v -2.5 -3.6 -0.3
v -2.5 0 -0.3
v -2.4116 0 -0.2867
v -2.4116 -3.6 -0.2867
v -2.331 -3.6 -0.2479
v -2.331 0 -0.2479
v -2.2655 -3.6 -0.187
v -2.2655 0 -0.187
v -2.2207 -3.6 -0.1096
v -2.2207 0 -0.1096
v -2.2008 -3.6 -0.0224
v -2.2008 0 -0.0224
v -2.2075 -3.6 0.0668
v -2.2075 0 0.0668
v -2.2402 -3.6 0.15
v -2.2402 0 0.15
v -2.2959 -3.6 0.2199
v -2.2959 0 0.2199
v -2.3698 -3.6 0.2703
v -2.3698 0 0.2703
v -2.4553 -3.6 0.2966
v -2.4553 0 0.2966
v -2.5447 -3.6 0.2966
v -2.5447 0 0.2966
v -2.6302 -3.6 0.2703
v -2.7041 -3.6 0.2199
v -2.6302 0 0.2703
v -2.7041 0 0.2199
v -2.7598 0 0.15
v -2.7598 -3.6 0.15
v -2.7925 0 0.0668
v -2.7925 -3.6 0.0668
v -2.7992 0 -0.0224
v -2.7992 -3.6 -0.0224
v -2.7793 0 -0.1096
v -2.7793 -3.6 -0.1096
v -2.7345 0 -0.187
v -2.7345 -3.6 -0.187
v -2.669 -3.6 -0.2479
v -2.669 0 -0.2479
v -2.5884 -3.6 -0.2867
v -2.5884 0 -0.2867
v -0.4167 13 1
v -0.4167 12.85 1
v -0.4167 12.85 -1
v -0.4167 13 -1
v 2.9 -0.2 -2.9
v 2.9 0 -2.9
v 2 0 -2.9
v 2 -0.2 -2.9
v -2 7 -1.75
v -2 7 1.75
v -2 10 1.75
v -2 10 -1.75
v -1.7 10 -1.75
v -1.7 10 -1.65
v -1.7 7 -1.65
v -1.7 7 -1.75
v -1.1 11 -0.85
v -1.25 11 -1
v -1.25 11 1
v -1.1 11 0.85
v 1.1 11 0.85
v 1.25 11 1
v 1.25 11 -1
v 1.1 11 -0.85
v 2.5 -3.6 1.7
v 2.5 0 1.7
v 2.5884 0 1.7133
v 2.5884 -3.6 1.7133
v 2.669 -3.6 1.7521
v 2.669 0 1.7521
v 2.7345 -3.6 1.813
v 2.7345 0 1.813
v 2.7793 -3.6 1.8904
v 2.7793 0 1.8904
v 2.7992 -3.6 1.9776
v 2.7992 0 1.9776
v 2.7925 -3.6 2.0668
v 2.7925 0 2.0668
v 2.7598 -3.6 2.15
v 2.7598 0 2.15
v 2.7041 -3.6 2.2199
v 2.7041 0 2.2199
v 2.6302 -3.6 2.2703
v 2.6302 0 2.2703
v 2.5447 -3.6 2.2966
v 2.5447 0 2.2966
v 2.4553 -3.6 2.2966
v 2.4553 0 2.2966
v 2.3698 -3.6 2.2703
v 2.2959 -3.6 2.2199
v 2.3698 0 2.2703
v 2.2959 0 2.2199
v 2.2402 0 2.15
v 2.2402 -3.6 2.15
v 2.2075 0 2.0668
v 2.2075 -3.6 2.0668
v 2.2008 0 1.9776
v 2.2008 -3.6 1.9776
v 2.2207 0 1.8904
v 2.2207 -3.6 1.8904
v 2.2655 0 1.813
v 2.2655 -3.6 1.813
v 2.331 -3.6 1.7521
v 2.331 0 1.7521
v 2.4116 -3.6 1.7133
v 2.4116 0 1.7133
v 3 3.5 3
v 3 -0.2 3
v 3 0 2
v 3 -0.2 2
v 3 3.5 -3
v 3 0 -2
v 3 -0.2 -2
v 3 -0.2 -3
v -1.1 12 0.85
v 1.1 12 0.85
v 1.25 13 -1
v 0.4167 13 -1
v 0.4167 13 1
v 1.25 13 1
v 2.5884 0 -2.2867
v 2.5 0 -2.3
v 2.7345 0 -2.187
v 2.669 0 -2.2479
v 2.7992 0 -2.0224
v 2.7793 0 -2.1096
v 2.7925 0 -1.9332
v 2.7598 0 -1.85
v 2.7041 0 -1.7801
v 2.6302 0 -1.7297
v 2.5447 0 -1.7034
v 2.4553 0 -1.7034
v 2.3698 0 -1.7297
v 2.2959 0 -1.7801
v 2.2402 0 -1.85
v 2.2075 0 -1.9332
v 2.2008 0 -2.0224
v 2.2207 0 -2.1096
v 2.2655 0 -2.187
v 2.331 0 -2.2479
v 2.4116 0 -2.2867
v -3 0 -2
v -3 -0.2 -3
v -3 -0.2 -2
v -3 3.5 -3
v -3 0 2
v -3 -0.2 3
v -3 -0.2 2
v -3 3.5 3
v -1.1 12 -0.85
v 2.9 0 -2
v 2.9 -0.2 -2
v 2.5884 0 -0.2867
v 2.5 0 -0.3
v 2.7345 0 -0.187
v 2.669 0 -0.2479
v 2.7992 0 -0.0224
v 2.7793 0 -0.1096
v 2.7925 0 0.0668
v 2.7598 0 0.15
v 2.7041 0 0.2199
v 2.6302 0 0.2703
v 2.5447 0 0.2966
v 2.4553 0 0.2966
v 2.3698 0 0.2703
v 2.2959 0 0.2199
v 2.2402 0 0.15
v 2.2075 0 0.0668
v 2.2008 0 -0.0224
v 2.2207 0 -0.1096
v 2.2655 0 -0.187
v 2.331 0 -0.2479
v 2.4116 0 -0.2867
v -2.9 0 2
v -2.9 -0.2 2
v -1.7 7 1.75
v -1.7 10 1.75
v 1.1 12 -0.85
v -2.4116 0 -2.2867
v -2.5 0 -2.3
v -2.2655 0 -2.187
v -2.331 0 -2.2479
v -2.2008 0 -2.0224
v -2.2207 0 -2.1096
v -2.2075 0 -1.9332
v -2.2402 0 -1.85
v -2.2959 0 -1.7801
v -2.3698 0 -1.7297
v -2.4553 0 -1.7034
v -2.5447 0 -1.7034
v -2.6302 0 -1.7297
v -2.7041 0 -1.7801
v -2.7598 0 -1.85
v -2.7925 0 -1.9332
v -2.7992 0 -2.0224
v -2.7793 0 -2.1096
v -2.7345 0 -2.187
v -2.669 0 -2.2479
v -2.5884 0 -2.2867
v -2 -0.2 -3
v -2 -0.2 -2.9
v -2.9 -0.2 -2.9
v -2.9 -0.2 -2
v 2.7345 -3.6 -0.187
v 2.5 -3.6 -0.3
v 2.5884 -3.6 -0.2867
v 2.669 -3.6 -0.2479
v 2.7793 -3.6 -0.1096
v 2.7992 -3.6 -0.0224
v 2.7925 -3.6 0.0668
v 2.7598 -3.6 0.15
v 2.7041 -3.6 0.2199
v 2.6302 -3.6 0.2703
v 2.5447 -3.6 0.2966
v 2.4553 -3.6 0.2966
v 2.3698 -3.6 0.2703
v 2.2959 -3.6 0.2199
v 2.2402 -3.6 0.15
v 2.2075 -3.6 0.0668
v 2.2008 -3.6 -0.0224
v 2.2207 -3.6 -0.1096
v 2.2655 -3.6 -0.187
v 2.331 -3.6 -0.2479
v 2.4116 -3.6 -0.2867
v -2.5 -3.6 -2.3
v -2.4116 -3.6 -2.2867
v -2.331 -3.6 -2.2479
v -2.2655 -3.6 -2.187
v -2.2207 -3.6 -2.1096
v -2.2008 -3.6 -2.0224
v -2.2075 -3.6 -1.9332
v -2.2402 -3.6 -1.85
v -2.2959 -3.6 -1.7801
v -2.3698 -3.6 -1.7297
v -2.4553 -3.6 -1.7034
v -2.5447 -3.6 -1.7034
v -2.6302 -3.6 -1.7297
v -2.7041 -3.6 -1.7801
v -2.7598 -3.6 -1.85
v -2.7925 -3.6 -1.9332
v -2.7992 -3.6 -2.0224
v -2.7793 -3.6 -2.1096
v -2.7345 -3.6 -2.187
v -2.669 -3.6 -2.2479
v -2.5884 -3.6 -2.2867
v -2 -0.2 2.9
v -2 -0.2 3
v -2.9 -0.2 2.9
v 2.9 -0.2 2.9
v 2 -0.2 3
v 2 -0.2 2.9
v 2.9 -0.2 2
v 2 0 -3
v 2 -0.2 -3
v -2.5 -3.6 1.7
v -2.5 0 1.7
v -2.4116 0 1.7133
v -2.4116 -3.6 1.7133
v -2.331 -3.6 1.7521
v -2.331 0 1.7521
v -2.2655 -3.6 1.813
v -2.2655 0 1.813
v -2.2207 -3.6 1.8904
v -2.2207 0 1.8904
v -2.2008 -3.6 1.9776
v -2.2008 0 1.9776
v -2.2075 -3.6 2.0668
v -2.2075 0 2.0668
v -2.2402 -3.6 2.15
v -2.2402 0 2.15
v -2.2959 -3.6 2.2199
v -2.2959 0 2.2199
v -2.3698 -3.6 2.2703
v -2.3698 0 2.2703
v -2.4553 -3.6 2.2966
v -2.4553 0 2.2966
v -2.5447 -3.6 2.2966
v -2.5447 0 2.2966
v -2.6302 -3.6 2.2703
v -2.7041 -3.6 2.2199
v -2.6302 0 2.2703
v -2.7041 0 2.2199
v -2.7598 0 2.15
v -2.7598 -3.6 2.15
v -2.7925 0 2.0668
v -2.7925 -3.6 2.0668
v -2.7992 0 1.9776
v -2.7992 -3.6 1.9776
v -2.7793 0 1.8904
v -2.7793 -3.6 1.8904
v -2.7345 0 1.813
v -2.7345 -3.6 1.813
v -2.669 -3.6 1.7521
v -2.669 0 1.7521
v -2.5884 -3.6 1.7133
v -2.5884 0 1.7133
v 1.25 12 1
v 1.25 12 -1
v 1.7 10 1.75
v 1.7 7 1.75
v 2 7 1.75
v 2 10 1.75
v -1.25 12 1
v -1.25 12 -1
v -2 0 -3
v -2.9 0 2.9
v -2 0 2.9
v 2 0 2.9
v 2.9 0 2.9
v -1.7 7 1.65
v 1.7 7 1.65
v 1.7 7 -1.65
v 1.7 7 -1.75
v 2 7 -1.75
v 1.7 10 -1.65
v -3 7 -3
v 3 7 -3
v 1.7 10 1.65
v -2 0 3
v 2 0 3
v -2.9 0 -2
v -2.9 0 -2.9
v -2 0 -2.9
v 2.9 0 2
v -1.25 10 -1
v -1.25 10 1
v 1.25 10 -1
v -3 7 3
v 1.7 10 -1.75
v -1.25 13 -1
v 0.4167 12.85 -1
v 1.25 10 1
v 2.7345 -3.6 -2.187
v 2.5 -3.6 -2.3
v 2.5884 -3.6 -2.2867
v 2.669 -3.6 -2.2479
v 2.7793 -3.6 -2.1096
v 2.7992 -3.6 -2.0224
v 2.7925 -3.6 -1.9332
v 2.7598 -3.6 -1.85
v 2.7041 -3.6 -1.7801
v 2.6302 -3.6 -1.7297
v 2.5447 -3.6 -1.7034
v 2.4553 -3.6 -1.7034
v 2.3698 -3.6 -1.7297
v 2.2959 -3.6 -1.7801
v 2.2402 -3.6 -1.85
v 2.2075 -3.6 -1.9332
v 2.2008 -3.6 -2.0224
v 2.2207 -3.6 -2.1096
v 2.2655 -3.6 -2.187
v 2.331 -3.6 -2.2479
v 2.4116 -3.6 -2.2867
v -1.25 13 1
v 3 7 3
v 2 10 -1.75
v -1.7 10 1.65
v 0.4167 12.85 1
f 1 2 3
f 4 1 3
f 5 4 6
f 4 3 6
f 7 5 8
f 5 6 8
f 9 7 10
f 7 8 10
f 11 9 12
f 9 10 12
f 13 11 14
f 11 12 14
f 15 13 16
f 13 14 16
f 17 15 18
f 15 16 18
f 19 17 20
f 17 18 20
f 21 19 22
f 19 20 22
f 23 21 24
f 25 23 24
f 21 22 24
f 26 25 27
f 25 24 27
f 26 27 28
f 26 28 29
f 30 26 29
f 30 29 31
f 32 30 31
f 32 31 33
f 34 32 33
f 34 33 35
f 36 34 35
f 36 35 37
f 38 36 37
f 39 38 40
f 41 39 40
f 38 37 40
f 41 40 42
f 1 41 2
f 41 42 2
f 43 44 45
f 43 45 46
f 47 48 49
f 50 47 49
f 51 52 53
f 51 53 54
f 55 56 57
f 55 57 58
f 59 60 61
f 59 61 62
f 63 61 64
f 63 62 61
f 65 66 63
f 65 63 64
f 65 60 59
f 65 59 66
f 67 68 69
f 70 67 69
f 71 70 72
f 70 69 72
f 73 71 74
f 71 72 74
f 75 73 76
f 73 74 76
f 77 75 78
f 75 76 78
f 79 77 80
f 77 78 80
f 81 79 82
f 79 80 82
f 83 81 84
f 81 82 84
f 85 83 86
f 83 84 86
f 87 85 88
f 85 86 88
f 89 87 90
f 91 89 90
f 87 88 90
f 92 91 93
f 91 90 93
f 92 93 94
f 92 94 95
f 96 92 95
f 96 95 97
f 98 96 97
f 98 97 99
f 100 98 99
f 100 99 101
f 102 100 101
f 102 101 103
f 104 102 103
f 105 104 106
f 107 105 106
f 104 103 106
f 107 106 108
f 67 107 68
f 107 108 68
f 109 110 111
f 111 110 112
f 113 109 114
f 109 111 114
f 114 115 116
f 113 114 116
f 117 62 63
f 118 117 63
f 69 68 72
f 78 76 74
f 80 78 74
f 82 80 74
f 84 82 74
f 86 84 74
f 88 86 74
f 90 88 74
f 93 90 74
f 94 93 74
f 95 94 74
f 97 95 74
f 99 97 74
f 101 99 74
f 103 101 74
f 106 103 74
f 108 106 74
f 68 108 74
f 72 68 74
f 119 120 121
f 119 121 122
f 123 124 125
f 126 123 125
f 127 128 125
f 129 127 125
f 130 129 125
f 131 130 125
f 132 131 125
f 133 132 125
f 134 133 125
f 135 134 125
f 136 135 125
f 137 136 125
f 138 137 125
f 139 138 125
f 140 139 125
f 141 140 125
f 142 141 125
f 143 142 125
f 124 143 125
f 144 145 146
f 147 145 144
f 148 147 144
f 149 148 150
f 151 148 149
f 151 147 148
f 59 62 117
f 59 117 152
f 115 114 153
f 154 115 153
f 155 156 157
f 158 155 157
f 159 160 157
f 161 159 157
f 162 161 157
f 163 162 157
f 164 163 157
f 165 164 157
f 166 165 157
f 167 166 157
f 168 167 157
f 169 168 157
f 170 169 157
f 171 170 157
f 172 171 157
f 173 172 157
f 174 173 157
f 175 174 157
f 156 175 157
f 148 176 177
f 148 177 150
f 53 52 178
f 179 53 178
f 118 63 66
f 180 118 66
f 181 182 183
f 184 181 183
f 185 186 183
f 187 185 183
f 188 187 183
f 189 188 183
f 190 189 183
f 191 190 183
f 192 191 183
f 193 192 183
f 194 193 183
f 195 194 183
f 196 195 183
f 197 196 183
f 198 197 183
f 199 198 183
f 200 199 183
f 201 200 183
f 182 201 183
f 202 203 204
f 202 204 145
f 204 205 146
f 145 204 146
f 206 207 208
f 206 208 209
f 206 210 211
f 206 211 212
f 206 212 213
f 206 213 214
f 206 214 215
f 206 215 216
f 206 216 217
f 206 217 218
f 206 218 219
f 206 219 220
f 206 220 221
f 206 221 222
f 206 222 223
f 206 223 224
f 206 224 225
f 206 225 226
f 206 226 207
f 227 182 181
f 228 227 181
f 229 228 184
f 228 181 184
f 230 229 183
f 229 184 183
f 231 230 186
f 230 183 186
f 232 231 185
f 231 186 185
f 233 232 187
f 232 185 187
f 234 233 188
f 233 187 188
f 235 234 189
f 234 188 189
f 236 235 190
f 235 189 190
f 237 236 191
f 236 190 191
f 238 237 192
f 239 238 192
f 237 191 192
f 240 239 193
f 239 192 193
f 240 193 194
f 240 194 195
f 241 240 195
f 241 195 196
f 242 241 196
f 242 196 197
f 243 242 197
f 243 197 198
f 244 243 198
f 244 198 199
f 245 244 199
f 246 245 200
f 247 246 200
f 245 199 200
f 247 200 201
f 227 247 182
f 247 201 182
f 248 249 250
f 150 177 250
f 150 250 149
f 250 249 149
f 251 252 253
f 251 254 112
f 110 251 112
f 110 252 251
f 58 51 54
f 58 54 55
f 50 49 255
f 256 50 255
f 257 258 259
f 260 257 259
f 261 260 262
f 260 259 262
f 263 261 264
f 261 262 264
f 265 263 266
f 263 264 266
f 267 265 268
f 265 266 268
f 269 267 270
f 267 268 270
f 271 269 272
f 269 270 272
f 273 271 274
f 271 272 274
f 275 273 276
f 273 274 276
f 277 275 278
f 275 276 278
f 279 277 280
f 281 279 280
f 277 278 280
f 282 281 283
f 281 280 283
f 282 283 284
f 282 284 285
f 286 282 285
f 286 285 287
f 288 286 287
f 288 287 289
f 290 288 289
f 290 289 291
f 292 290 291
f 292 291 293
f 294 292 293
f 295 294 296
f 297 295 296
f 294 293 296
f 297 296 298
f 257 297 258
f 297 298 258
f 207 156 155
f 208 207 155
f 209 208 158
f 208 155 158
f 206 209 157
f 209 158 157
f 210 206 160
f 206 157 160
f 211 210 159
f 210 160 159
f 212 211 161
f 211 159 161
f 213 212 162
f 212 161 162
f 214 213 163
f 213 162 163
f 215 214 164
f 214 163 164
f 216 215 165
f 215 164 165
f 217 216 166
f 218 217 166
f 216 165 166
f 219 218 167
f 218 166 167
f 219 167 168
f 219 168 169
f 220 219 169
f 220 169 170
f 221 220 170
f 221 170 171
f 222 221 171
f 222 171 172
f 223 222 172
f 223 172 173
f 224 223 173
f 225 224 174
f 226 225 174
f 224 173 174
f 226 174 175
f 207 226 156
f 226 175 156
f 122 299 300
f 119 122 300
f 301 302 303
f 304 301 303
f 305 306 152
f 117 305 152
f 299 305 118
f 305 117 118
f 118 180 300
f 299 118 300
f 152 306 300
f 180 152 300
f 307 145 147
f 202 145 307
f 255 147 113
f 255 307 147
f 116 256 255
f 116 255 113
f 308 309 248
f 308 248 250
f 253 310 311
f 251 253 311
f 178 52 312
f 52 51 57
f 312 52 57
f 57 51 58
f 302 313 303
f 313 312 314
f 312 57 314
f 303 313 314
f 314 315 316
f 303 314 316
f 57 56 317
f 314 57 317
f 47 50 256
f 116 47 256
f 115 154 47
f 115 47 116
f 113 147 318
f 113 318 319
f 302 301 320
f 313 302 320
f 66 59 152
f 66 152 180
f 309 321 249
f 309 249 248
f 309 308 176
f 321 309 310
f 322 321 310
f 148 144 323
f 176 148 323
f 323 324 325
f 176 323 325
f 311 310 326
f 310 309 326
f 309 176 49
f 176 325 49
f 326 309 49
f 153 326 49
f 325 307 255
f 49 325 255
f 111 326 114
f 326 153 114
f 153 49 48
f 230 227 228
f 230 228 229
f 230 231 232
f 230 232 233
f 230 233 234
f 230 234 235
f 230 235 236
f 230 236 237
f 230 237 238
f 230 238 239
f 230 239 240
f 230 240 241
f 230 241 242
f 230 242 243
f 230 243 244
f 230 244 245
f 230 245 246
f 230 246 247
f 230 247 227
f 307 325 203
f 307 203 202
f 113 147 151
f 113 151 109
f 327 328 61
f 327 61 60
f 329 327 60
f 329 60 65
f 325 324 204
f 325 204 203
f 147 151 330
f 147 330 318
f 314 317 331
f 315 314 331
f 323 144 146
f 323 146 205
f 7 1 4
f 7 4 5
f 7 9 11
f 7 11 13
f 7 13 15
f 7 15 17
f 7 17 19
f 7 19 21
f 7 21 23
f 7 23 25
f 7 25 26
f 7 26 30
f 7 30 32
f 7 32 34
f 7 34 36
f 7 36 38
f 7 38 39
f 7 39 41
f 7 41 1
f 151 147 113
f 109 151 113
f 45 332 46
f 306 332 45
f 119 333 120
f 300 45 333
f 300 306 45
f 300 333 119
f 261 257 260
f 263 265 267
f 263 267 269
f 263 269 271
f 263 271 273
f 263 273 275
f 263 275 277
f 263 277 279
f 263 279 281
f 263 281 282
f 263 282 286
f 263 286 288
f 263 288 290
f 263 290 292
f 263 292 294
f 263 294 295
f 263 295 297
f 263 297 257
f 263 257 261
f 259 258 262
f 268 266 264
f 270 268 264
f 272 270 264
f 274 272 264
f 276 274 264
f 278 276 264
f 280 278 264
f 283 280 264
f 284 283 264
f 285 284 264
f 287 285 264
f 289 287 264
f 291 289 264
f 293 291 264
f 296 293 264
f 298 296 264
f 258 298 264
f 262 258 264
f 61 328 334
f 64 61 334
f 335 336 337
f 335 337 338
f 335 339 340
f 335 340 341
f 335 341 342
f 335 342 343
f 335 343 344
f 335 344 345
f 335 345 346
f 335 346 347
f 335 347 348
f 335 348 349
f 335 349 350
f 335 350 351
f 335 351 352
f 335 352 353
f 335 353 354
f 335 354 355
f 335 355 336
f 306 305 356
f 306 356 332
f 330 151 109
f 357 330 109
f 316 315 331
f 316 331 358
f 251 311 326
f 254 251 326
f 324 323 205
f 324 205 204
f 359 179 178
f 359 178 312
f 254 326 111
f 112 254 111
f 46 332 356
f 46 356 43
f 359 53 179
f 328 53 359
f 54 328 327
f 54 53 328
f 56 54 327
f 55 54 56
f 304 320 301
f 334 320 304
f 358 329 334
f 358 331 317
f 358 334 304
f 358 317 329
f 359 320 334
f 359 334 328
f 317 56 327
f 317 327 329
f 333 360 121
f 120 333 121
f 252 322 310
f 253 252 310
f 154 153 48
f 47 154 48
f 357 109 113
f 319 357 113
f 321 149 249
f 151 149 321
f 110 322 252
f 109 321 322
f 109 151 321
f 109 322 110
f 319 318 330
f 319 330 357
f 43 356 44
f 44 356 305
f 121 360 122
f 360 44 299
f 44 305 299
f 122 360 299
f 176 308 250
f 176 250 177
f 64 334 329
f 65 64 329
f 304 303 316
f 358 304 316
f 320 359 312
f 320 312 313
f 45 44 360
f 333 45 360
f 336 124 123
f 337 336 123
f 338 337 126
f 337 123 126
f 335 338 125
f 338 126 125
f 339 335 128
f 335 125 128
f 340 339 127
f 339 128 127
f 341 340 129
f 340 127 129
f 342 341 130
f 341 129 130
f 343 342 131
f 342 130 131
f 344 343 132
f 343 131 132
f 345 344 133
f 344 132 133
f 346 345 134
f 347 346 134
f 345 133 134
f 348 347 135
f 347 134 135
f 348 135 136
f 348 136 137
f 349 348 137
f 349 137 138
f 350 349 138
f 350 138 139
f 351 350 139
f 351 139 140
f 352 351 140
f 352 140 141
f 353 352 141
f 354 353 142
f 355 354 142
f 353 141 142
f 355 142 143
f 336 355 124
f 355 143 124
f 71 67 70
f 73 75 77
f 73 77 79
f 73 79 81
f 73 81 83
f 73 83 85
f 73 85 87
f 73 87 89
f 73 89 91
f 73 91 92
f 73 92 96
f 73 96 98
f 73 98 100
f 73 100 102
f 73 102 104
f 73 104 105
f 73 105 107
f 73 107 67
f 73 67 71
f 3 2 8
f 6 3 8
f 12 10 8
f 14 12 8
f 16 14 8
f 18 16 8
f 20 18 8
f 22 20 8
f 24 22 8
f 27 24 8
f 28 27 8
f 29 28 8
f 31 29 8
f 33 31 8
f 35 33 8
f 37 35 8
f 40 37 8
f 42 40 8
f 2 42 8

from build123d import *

# Parameters (mm, degrees)
SKETCH_1_W                     = 6
SKETCH_1_H                     = 6
EXTRUDE_1_DEPTH                = 7
SPLIT_BODIES_1_SURFACE_1_BACK  = 12
SPLIT_BODIES_1_SURFACE_1_DEPTH = 24
SPLIT_BODIES_1_SURFACE_2_BACK  = 12
SPLIT_BODIES_1_SURFACE_2_DEPTH = 24
SKETCH_3_W                     = 4
SKETCH_3_H                     = 3.5
EXTRUDE_2_DEPTH                = 3
EXTRUDE_START                  = 3
SKETCH_3_3_W                   = 2.5
SKETCH_3_3_H                   = 2
EXTRUDE_3_DEPTH                = 3
SKETCH_4_W                     = 0.833333334
SKETCH_4_H                     = 0.3
CUT_EXTRUDE_1_DEPTH            = 14.928388277
SWEEP_START                    = 11
SWEEP_1_OUTLINE_W              = 2.5
SWEEP_1_OUTLINE_H              = 2
SWEEP_1_OUTLINE_W_2            = 2.2
SWEEP_1_OUTLINE_H_2            = 1.7
SWEEP_1_DEPTH                  = 1
SKETCH_10_W                    = 3.4
SKETCH_10_H                    = 0.2
CUT_EXTRUDE_2_DEPTH            = 3
EXTRUDE_4_DEPTH                = 0.2
SKETCH_12_R                    = 0.3
EXTRUDE_5_DEPTH                = 3.6
EXTRUDE_5_2_DEPTH              = 3.6
EXTRUDE_5_3_DEPTH              = 3.6
EXTRUDE_5_4_DEPTH              = 3.6
EXTRUDE_5_5_DEPTH              = 3.6
EXTRUDE_5_6_DEPTH              = 3.6


# Read off the part's stored shape, not the designer's step: Вырез-По траектории1
with BuildPart() as part:
    # Эскиз1 → Бобышка-Вытянуть1 (new body)
    with BuildSketch(Plane(origin=(0, 0, 0), x_dir=(1, 0, 0), z_dir=(0, 1, 0))):
        Rectangle(SKETCH_1_W, SKETCH_1_H)
    extrude(amount=EXTRUDE_1_DEPTH)


with BuildPart() as body_2:
    # Split Bodies 1: the piece behind the surface
    add(part.part)
    # Split Bodies 1 surface: a surface, the sketch's curves swept straight by 24 mm
    with BuildLine(Plane.XY.offset(3).offset(-SPLIT_BODIES_1_SURFACE_1_BACK), mode=Mode.PRIVATE) as split_bodies_1_surface_1_path:
        Line((-3, 3.5), (3, 3.5))
    split_bodies_1_surface_1 = Shell.extrude(split_bodies_1_surface_1_path.wire(), (0 * SPLIT_BODIES_1_SURFACE_1_DEPTH, 0 * SPLIT_BODIES_1_SURFACE_1_DEPTH, 1 * SPLIT_BODIES_1_SURFACE_1_DEPTH))
    split(bisect_by=split_bodies_1_surface_1, keep=Keep.BOTTOM)

    # Эскиз11 → Бобышка-Вытянуть4 (add)
    with BuildSketch(Plane.XZ):
        Polygon((-3, 3), (-2, 3), (-2, 2.9), (-2.9, 2.9), (-2.9, 2), (-3, 2), align=None)
        Polygon((2, 3), (2, 2.9), (2.9, 2.9), (2.9, 2), (3, 2), (3, 3), align=None)
        Polygon((3, -2), (2.9, -2), (2.9, -2.9), (2, -2.9), (2, -3), (3, -3), align=None)
        Polygon((-3, -2), (-2.9, -2), (-2.9, -2.9), (-2, -2.9), (-2, -3), (-3, -3), align=None)
    extrude(amount=EXTRUDE_4_DEPTH)


with BuildPart() as part_1:
    add(part.part)

    # Split Bodies 1: split by a surface, the side it looks to stays
    # Split Bodies 1 surface: a surface, the sketch's curves swept straight by 24 mm
    with BuildLine(Plane.XY.offset(3).offset(-SPLIT_BODIES_1_SURFACE_2_BACK), mode=Mode.PRIVATE) as split_bodies_1_surface_2_path:
        Line((-3, 3.5), (3, 3.5))
    split_bodies_1_surface_2 = Shell.extrude(split_bodies_1_surface_2_path.wire(), (0 * SPLIT_BODIES_1_SURFACE_2_DEPTH, 0 * SPLIT_BODIES_1_SURFACE_2_DEPTH, 1 * SPLIT_BODIES_1_SURFACE_2_DEPTH))
    split(bisect_by=split_bodies_1_surface_2, keep=Keep.TOP)


with BuildPart() as body_3:
    # Эскиз3 → Бобышка-Вытянуть2 (new body)
    with BuildSketch(Plane(origin=(0, 7, 0), x_dir=(1, 0, 0), z_dir=(0, 1, 0))):
        Rectangle(SKETCH_3_W, SKETCH_3_H)
    extrude(amount=EXTRUDE_2_DEPTH)

    # Эскиз3<3> → Бобышка-Вытянуть3 (add)
    with BuildSketch(Plane(origin=(0, 7, 0), x_dir=(1, 0, 0), z_dir=(0, 1, 0)).offset(EXTRUDE_START)):
        Rectangle(SKETCH_3_3_W, SKETCH_3_3_H)
    extrude(amount=EXTRUDE_3_DEPTH)

    # Эскиз4 → Вырез-Вытянуть1 (cut, through all)
    with BuildSketch(Plane.XY.offset(1)):
        with Locations((0, 13)):
            Rectangle(SKETCH_4_W, SKETCH_4_H)
    extrude(amount=-CUT_EXTRUDE_1_DEPTH, mode=Mode.SUBTRACT)

    # Вырез-По траектории1 outline → Вырез-По траектории1 (cut)
    with BuildSketch(Plane(origin=(0, 0, 0), x_dir=(1, 0, 0), z_dir=(0, 1, 0)).offset(SWEEP_START)):
        Rectangle(SWEEP_1_OUTLINE_W, SWEEP_1_OUTLINE_H)
        Rectangle(SWEEP_1_OUTLINE_W_2, SWEEP_1_OUTLINE_H_2, mode=Mode.SUBTRACT)
    extrude(amount=SWEEP_1_DEPTH, mode=Mode.SUBTRACT)

    # Эскиз10 → Вырез-Вытянуть2 (cut)
    with BuildSketch(Plane(origin=(0, 10, 0), x_dir=(1, 0, 0), z_dir=(0, 1, 0))):
        with Locations((0, -1.75)):
            Rectangle(SKETCH_10_W, SKETCH_10_H)
        with Locations((0, 1.75)):
            Rectangle(SKETCH_10_W, SKETCH_10_H)
    extrude(amount=-CUT_EXTRUDE_2_DEPTH, mode=Mode.SUBTRACT)


with BuildPart() as body_4:
    # Эскиз12 → Бобышка-Вытянуть5 (new body)
    with BuildSketch(Plane.XZ):
        with Locations(Location((-2.5, 2, 0), (0, 0, 270))):
            Circle(SKETCH_12_R)
    extrude(amount=EXTRUDE_5_DEPTH)


with BuildPart() as body_5:
    # Эскиз12 → Extrude 5 2 (new body)
    with BuildSketch(Plane.XZ):
        with Locations(Location((2.5, 2, 0), (0, 0, 270))):
            Circle(SKETCH_12_R)
    extrude(amount=EXTRUDE_5_2_DEPTH)


with BuildPart() as body_6:
    # Эскиз12 → Extrude 5 3 (new body)
    with BuildSketch(Plane.XZ):
        with Locations(Location((2.5, 0, 0), (0, 0, 270))):
            Circle(SKETCH_12_R)
    extrude(amount=EXTRUDE_5_3_DEPTH)


with BuildPart() as body_7:
    # Эскиз12 → Extrude 5 4 (new body)
    with BuildSketch(Plane.XZ):
        with Locations(Location((2.5, -2, 0), (0, 0, 270))):
            Circle(SKETCH_12_R)
    extrude(amount=EXTRUDE_5_4_DEPTH)


with BuildPart() as body_8:
    # Эскиз12 → Extrude 5 5 (new body)
    with BuildSketch(Plane.XZ):
        with Locations(Location((-2.5, 0, 0), (0, 0, 270))):
            Circle(SKETCH_12_R)
    extrude(amount=EXTRUDE_5_5_DEPTH)


with BuildPart() as body_9:
    # Эскиз12 → Extrude 5 6 (new body)
    with BuildSketch(Plane.XZ):
        with Locations(Location((-2.5, -2, 0), (0, 0, 270))):
            Circle(SKETCH_12_R)
    extrude(amount=EXTRUDE_5_6_DEPTH)


solid = Compound([body_2.part, part_1.part, body_3.part, body_4.part, body_5.part, body_6.part, body_7.part, body_8.part, body_9.part])
